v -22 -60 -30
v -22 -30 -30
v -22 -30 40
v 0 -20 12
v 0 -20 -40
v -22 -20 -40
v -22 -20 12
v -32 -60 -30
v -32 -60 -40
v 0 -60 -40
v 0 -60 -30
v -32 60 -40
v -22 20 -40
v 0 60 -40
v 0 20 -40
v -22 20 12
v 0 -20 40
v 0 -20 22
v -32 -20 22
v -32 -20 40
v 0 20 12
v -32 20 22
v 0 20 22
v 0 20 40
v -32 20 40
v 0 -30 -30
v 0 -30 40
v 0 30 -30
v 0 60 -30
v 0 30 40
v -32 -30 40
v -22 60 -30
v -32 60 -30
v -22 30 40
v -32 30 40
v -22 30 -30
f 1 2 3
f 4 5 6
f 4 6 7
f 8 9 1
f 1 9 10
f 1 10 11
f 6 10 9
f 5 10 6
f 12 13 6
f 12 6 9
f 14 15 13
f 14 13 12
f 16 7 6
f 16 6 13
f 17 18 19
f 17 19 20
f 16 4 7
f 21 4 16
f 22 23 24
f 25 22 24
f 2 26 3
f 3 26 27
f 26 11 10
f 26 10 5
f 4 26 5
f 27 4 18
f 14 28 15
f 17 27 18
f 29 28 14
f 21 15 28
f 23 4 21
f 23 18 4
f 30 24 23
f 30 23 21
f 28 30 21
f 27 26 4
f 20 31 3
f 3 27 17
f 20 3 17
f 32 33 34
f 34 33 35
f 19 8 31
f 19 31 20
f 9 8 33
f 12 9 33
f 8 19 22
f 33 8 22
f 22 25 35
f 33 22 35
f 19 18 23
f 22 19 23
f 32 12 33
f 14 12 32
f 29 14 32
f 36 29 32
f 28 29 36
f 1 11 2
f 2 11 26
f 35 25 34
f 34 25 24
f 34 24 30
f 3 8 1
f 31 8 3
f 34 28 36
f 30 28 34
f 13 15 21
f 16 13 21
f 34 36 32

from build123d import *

# Parameters (mm, degrees)
F0_W     = 120
F0_H     = 80
F1_DEPTH = 32
F2_W     = 40
F2_H     = 52
F3_DEPTH = 22
F4_W     = 40
F4_H     = 18
F5_DEPTH = 32.001
F6_W     = 30
F6_H     = 70
F7_DEPTH = 32.001
F9_DEPTH = 10


# Not quite as in the source:
# - a pattern or mirror of a feature is missing from the dataset's text; its kind, count and spacing are read off the source's solid


with BuildPart() as f1:
    # F0 (on Right) → F1 (new body)
    with BuildSketch(Plane.YZ):
        Rectangle(F0_W, F0_H)
    extrude(amount=-F1_DEPTH)

    # F2 (on face) → F3 (cut)
    with BuildSketch(Plane.YZ):
        with Locations((0, -14)):
            Rectangle(F2_W, F2_H)
    extrude(amount=-F3_DEPTH, mode=Mode.SUBTRACT)

    # F4 (on face) → F5 (cut, through all)
    with BuildSketch(Plane.YZ):
        with Locations((0, 31)):
            Rectangle(F4_W, F4_H)
    extrude(amount=-F5_DEPTH, mode=Mode.SUBTRACT)

    # F6 (on face) → F7 (cut, through all)
    with BuildSketch(Plane.YZ):
        with Locations((-45, 5)):
            Rectangle(F6_W, F6_H)
    f7 = extrude(amount=-F7_DEPTH, mode=Mode.SUBTRACT)

    # F7_copies: F7 across plane
    add(f7.mirror(Plane.ZX), mode=Mode.SUBTRACT)

    # F8 (on face) → F9 (join)
    with BuildSketch(Plane(origin=(-32, 0, 0), x_dir=(0, -1, 0), z_dir=(-1, 0, 0))):
        Polygon((60, -30), (30, 40), (30, -30), align=None)
    f9 = extrude(amount=-F9_DEPTH)

    # F9_copies: F9 across plane
    add(f9.mirror(Plane.ZX))


solid = f1.part
